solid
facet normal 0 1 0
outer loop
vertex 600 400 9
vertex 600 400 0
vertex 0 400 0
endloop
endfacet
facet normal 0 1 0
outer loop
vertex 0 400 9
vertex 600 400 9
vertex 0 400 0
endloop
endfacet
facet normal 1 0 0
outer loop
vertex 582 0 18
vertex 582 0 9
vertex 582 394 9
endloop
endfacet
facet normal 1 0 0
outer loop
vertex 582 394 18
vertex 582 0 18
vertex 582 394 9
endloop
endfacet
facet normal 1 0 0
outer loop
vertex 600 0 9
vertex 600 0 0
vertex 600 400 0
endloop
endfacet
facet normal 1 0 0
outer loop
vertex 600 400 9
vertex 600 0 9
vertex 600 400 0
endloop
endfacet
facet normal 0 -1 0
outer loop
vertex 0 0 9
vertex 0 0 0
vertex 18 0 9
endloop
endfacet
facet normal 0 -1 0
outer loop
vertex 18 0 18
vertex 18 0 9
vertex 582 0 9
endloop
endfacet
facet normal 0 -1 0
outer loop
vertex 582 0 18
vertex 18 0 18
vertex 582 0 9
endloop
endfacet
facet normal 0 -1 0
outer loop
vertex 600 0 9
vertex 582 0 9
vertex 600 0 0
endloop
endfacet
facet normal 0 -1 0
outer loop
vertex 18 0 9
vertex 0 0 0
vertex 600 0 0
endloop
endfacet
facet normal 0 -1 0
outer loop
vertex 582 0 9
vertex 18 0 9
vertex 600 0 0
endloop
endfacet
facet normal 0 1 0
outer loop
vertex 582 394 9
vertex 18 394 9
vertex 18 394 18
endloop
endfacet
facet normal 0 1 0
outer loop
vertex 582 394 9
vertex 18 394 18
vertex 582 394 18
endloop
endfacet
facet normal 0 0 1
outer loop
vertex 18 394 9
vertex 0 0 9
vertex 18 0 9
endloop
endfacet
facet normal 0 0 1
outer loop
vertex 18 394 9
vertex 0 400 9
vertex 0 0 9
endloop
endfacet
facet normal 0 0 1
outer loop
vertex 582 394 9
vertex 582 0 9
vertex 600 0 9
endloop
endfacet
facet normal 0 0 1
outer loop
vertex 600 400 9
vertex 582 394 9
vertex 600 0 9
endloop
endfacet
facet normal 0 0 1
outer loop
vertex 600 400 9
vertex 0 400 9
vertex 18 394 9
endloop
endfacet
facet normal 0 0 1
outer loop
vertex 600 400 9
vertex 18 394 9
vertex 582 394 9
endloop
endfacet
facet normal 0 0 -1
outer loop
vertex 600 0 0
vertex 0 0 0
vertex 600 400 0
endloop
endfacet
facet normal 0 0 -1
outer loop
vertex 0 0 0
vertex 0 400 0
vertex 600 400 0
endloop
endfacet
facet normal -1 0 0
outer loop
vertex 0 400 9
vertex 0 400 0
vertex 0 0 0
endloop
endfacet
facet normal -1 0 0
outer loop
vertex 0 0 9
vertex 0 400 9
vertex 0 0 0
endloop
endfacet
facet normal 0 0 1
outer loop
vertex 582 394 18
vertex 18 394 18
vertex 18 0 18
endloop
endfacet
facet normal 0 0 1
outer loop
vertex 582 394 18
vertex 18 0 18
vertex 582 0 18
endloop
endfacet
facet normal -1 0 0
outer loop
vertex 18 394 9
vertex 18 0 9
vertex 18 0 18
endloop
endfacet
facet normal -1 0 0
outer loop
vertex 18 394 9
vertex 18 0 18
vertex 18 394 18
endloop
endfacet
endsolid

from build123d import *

# Parameters (mm, degrees)
F0_W     = 564
F0_H     = 394
F1_DEPTH = 18
F0_W_2   = 18
F0_H_2   = 6
F2_DEPTH = 9


with BuildPart() as f1:
    # F0 (on Top) → F1 (new body)
    with BuildSketch(Plane.XY):
        with Locations((300, 197)):
            Rectangle(F0_W, F0_H)
    extrude(amount=F1_DEPTH)

    # F0 (on Top) → F2 (join)
    with BuildSketch(Plane.XY):
        with Locations((9, 197)):
            Rectangle(F0_W_2, F0_H)
        with Locations((300, 397)):
            Rectangle(F0_W, F0_H_2)
        with Locations((9, 397)):
            Rectangle(F0_W_2, F0_H_2)
        with Locations((591, 397)):
            Rectangle(F0_W_2, F0_H_2)
        with Locations((591, 197)):
            Rectangle(F0_W_2, F0_H)
    extrude(amount=F2_DEPTH)


solid = f1.part
